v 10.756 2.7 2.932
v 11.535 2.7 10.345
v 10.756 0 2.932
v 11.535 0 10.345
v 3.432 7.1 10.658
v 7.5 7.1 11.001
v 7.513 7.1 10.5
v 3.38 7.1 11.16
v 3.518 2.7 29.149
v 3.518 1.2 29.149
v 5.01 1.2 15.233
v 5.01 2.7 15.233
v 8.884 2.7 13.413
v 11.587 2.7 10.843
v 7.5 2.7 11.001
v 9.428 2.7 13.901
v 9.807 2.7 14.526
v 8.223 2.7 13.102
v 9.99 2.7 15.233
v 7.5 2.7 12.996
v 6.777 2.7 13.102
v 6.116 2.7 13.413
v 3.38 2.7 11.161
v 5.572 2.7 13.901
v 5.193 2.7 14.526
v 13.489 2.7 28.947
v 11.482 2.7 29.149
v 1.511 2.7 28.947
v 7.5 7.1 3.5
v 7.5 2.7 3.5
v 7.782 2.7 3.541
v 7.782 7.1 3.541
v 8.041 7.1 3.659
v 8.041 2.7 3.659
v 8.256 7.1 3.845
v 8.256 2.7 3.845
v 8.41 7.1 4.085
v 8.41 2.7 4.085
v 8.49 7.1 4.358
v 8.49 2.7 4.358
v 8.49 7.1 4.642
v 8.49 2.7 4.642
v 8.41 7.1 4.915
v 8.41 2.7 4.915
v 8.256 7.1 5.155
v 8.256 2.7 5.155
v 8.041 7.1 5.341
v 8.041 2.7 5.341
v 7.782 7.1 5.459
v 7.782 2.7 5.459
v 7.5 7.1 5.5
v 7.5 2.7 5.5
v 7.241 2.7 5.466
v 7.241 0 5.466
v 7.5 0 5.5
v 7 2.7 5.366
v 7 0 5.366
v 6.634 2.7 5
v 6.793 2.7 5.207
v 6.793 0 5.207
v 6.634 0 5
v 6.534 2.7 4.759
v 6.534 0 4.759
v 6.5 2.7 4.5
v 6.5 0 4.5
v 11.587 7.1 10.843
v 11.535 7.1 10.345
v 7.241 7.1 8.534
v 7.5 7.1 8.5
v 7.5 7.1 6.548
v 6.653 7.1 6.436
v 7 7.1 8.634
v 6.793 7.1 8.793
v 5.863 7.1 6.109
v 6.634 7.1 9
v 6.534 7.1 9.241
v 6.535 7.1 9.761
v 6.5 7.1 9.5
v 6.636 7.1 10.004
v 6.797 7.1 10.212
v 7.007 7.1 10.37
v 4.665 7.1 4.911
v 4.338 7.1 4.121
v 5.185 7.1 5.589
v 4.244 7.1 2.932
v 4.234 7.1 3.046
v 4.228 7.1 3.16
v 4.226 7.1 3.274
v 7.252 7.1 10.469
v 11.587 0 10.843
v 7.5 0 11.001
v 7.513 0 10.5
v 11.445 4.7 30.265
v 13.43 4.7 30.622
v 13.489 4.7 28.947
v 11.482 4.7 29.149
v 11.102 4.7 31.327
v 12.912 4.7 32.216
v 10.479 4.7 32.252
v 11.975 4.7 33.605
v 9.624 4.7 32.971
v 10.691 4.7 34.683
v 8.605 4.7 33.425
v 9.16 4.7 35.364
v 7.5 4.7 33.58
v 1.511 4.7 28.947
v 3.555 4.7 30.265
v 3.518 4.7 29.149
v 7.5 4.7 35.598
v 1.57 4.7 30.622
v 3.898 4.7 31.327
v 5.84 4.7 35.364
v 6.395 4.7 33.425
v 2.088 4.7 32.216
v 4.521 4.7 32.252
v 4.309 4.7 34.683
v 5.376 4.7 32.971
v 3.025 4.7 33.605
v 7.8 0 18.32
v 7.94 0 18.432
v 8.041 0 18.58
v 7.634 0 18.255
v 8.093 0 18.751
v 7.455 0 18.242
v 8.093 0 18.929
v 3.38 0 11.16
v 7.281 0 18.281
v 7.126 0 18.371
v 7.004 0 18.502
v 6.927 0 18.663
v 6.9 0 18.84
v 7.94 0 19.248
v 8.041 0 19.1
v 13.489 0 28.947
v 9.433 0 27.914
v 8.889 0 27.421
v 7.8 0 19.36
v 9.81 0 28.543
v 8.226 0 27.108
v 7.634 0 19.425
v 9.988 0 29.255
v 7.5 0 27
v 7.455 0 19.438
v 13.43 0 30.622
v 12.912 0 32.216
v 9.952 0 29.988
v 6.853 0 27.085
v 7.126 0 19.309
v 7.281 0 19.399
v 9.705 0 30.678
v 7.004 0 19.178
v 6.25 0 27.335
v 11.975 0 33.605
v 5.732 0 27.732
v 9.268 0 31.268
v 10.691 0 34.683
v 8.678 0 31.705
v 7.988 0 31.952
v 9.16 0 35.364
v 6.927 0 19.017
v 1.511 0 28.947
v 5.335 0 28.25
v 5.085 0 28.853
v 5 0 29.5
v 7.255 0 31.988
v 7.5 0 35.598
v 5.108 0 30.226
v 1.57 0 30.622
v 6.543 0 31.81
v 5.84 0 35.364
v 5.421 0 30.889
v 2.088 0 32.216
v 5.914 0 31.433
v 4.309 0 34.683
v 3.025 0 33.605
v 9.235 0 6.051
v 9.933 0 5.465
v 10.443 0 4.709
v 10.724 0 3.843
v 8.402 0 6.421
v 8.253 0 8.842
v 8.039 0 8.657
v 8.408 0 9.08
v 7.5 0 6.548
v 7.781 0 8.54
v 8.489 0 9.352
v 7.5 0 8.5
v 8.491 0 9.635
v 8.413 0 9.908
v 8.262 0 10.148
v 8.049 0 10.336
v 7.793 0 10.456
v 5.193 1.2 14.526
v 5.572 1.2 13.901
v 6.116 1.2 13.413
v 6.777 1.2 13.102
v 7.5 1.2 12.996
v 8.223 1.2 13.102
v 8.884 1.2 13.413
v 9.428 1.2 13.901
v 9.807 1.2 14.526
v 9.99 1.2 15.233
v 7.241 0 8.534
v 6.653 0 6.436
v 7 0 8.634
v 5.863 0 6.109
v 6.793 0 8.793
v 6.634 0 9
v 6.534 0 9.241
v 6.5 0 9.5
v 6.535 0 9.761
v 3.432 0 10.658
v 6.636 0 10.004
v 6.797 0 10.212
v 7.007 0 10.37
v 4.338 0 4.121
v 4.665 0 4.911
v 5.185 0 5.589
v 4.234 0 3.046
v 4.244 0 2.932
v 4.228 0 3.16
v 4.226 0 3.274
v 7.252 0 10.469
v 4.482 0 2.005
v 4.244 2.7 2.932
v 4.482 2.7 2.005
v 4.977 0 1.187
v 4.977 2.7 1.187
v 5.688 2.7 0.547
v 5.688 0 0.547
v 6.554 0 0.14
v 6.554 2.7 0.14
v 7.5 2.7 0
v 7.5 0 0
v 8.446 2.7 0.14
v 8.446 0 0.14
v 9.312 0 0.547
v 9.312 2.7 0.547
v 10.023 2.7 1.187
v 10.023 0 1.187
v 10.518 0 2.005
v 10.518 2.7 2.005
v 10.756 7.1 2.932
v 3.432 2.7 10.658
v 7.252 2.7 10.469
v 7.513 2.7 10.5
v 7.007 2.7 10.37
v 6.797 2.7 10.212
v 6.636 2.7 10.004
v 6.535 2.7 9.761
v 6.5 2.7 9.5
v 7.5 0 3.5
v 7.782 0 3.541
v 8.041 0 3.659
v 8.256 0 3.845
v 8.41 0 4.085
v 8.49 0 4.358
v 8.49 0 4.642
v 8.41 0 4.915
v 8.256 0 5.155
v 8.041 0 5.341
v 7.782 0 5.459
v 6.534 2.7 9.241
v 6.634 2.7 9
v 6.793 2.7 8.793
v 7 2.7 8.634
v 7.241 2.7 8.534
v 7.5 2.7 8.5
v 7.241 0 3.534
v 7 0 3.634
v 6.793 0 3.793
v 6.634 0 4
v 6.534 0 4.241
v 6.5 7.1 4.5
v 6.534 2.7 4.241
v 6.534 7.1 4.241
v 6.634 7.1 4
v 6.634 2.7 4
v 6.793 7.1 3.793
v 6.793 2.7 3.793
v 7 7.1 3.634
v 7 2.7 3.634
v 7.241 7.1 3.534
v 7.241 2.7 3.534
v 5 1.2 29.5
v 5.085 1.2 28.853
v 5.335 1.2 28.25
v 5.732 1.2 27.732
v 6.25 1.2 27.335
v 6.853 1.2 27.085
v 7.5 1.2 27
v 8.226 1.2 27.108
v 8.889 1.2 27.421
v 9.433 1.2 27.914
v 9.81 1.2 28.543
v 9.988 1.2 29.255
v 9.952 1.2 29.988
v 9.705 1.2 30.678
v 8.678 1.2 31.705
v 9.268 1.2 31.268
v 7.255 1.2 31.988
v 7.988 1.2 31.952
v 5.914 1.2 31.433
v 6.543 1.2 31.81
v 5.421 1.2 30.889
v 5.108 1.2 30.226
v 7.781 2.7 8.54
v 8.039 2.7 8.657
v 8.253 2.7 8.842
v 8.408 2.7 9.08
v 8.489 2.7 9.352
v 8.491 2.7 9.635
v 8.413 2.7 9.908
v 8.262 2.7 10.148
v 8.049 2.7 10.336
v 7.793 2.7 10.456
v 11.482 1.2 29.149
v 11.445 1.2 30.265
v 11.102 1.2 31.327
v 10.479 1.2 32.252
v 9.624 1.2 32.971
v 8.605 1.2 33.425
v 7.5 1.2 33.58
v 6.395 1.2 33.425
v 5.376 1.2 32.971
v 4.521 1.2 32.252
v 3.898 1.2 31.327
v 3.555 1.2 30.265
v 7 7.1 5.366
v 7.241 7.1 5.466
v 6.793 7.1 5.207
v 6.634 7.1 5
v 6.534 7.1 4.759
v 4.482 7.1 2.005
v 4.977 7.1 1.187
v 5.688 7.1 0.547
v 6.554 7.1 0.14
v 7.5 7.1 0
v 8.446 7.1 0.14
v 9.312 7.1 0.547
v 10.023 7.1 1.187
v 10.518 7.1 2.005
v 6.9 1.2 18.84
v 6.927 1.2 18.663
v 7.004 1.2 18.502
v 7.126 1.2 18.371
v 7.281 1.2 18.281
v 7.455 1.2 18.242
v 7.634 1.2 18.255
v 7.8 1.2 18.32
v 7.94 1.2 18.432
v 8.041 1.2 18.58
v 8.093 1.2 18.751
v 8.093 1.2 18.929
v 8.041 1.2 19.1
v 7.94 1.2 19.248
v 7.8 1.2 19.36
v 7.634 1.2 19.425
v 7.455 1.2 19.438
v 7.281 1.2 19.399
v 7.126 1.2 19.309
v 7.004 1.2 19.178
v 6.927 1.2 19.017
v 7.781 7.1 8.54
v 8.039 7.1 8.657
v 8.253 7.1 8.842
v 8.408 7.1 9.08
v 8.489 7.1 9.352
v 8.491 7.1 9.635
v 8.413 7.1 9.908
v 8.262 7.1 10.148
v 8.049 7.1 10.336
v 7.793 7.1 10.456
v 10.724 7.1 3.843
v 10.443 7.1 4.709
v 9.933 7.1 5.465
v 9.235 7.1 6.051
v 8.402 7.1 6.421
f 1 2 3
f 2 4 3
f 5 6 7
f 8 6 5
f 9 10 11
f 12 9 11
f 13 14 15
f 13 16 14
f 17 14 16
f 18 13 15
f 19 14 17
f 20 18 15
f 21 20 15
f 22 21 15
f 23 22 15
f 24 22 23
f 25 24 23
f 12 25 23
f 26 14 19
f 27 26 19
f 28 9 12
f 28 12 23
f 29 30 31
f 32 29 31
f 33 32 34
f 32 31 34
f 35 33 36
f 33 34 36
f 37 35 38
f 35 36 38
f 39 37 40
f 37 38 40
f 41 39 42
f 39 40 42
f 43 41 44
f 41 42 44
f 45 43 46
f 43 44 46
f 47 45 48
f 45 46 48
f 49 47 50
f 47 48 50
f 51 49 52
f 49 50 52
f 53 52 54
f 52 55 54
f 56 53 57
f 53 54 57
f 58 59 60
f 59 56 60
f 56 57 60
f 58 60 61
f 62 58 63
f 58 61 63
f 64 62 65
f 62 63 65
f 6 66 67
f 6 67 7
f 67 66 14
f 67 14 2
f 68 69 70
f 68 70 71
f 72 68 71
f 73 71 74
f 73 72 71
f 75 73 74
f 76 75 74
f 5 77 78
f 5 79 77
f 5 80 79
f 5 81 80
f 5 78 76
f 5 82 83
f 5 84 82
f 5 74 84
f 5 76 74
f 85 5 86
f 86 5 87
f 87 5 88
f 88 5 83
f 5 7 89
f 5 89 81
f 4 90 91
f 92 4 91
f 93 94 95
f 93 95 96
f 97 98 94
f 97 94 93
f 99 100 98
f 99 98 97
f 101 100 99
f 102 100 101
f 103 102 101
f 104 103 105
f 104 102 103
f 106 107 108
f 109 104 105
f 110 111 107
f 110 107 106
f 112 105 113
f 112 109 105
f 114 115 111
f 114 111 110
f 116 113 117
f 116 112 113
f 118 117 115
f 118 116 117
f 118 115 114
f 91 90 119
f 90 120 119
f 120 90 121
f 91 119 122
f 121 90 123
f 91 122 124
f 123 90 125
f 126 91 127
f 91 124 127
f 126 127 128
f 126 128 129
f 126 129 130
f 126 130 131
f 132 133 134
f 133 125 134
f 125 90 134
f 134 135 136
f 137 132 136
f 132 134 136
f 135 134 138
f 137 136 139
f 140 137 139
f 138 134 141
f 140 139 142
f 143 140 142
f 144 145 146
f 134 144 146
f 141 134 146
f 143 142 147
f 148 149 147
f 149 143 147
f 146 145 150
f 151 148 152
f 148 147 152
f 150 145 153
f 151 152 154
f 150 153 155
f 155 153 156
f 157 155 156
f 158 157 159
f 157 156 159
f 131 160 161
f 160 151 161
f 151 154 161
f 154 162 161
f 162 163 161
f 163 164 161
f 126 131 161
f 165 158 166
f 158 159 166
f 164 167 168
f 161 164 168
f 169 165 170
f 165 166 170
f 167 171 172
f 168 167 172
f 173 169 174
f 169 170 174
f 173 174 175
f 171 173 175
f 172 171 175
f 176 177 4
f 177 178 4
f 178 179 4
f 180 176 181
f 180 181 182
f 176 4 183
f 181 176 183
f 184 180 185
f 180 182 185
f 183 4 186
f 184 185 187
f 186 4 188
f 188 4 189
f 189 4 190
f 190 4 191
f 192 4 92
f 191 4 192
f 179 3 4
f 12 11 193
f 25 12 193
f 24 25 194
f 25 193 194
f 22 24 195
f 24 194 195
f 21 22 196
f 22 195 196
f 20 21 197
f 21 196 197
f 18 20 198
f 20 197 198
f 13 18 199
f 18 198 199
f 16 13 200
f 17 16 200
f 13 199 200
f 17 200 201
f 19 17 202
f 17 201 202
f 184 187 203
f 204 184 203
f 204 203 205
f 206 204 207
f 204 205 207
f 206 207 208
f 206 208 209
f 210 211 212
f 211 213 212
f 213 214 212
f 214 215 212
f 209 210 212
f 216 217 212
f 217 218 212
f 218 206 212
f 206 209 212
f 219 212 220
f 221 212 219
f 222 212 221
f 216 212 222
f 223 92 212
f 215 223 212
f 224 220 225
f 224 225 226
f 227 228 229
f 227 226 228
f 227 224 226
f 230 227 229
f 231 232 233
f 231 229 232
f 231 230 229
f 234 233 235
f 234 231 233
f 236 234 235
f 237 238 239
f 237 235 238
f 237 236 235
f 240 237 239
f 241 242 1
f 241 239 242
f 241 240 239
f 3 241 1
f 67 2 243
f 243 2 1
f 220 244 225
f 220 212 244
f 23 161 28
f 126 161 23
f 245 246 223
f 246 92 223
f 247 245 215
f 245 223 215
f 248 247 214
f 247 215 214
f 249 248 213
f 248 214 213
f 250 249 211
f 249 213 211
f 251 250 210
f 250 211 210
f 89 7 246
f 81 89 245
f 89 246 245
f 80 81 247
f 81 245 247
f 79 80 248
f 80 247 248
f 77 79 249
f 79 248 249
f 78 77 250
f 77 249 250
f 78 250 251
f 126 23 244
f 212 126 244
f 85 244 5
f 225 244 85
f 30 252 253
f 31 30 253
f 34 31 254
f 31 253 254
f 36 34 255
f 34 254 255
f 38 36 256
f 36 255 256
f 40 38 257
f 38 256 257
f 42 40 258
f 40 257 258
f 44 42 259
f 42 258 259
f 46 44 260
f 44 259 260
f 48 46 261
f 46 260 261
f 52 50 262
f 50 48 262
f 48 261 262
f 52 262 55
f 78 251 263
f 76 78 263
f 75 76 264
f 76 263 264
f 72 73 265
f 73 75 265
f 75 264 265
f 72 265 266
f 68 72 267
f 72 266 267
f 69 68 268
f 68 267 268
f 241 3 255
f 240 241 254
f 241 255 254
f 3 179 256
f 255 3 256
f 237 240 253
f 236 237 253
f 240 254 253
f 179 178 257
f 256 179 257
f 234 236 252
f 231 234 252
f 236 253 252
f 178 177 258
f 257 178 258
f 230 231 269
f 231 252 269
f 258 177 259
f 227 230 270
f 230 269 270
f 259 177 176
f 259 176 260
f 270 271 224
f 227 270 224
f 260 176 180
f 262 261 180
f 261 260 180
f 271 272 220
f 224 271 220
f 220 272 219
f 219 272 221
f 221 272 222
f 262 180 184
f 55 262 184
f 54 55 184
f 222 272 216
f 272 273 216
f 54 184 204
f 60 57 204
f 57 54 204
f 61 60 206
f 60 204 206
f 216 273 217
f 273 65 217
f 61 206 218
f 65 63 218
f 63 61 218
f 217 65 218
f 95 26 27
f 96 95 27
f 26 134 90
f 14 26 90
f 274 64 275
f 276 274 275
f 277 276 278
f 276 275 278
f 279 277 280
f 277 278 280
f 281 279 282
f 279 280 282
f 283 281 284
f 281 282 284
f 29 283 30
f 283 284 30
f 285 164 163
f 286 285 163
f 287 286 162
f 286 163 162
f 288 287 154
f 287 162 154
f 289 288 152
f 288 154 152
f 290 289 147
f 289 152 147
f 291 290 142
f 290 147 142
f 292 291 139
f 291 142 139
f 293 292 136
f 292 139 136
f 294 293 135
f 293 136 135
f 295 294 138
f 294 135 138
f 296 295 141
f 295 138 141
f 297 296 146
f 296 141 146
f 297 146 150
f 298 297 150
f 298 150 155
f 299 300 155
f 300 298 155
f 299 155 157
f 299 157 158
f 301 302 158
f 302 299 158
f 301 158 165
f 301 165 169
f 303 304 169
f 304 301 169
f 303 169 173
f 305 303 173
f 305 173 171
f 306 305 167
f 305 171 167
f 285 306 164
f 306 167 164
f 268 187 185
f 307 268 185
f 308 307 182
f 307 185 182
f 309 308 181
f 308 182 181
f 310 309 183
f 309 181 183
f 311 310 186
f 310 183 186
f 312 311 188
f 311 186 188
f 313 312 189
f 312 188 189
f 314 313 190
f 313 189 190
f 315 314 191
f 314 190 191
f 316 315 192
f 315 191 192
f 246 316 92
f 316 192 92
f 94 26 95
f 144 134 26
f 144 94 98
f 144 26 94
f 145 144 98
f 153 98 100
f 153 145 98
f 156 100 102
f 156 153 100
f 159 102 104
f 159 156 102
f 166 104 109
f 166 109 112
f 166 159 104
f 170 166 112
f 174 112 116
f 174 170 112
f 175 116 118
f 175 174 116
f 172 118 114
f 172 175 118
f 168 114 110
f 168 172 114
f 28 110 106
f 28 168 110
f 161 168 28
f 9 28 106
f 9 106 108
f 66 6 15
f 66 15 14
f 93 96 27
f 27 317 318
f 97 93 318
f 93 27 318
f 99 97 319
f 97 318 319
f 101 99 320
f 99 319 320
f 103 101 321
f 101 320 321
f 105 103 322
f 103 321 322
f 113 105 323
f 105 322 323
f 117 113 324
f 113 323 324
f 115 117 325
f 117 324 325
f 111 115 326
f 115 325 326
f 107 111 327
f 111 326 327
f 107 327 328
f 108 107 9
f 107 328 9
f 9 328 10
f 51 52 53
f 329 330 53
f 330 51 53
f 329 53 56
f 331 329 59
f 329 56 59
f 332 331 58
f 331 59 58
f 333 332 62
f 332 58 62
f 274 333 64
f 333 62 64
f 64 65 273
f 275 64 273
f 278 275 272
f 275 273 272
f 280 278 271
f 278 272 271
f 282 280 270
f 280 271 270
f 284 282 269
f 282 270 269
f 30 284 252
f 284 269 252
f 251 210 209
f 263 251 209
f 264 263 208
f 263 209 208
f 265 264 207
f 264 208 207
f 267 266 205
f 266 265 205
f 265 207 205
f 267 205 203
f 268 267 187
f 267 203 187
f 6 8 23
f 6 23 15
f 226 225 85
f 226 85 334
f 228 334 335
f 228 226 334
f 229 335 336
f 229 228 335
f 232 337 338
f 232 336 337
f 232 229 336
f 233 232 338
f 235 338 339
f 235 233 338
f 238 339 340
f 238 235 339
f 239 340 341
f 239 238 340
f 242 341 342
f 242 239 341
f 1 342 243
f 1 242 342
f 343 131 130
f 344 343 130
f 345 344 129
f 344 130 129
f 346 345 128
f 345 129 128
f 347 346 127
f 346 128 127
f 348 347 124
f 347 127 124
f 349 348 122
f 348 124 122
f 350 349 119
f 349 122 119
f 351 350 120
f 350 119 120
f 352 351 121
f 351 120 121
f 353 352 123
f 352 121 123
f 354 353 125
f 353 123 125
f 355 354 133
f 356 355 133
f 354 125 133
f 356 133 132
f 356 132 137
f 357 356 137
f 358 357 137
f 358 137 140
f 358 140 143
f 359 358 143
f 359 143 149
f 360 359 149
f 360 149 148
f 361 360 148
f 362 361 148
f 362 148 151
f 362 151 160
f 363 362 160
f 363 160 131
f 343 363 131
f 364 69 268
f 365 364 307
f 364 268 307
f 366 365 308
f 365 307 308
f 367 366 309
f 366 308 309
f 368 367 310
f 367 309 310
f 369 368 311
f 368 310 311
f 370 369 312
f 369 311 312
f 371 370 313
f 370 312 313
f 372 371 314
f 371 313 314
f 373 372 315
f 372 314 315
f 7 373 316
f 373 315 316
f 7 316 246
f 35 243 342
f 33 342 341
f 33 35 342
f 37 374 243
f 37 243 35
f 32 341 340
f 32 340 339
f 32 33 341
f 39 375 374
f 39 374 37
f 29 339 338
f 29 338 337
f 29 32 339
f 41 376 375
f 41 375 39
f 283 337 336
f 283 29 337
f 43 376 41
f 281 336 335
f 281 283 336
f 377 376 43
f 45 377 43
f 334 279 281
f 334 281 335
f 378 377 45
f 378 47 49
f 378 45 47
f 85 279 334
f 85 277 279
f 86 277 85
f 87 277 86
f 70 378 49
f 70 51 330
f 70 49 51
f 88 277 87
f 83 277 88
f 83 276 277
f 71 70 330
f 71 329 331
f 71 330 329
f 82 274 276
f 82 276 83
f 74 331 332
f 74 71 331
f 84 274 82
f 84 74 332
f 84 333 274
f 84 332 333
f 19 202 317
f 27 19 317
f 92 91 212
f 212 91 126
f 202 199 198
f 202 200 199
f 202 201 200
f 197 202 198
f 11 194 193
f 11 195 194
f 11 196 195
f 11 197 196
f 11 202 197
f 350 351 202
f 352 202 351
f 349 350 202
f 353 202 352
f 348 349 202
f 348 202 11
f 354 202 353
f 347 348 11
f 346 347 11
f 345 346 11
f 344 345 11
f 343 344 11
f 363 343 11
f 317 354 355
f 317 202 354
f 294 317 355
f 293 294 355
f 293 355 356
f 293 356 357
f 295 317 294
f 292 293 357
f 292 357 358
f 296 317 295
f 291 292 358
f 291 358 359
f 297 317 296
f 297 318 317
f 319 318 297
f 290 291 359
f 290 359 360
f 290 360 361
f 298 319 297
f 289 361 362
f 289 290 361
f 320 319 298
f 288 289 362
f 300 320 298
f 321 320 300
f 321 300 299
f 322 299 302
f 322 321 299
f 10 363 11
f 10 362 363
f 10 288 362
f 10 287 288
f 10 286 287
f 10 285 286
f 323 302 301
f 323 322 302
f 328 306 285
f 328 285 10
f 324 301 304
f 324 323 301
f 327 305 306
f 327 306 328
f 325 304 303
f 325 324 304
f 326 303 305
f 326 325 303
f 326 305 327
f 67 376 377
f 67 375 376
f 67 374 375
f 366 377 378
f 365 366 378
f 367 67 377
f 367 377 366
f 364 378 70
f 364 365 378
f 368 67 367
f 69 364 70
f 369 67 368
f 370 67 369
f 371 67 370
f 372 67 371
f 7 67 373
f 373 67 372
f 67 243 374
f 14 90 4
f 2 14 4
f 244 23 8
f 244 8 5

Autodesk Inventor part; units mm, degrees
ref_plane "YZ Plane" through (0, 0, 0) normal (1, 0, 0) x (0, 1, 0)
ref_plane "XZ Plane" through (0, 0, 0) normal (0, 1, 0) x (-1, 0, 0)
ref_plane "XY Plane" through (0, 0, 0) normal (0, 0, 1) x (1, 0, 0)
sketch "Sketch1" plane through (0, 0, 0) normal (0, 1, 0) x (-1, 0, 0)
  circle A0 centre (-7.5, 4.5) radius 1
  circle A1 centre (-7.5, 9.5) radius 1
  circle A2 centre (-7.5, 18.84) radius 0.6
  circle A3 centre (-7.5, 29.5) radius 2.5
  circle A4 centre (-7.5, 29.576) radius 6.0215
  circle A5 centre (-7.5, 29.576) radius 4.0045
  circle A6 centre (-7.5, 3.274) radius 3.274
  circle A7 centre (-7.5, 15.5) radius 2.5045
  line L0 (-7.5, 3.274) -> (-7.5, 29.576)
  line L1 (-3.5183, 29.1493) -> (-5.0098, 15.2331)
  line L2 (-9.9902, 15.2331) -> (-11.4817, 29.1493)
  line L3 (-1.5114, 28.947) -> (-4.2439, 2.932)
  line L4 (-13.4886, 28.947) -> (-10.7561, 2.932)
  line L5 (-1.5114, 28.947) -> (-3.5183, 29.1493)
  line L6 (-13.4886, 28.947) -> (-11.4817, 29.1493)
  line L7 (-3.4324, 10.6581) -> (-11.5347, 10.3447)
  line L8 (-3.3796, 11.1605) -> (-11.587, 10.843)
  point P0 (0, 0)
  point P1 (-7.5, 10.5007)
  point P2 (-7.5, 10.5)
  point P3 (-7.5387, 10.4993)
  dimension "d2" = 2
  dimension "d3" = 2
  dimension "d4" = 1.2
  dimension "d5" = 5
  dimension "d6" = 12.043
  dimension "d7" = 8.009
  dimension "d8" = 6.548
  dimension "d9" = 5.009
  dimension "d10" = 5
  dimension "d11" = 1.226
  dimension "d12" = 6
  dimension "d15" = 26.302
  dimension "d16" = 3.34
  dimension "d17" = 10.66
  dimension "d18" = 26.302
  dimension "d19" = 25
  dimension "d28" = 0.5
extrude "Extrusion1" add sketch "Sketch1" along normal blind 4.7 contours A4 L5 A5 L6
extrude "Extrusion2" add sketch "Sketch1" along normal blind 2.7 contours A6 | A6 L4 L7 A1 L0 | L0 A1 L7 L3 A6 | L4 L8 L0 L7 | L0 L8 L3 L7 | L4 A4 L2 A7 L0 L8 | L0 A7 L1 A4 L3 L8 | L6 L2 A4 | A4 L1 L5
extrude "Extrusion3" add sketch "Sketch1" along normal blind 1.2 contours L0 A7 | A7 L0 | L2 A5 L0 A4 | A4 L0 A2 A7 L2 | A5 | A7 L0 A2 A4 L1 | A4 L0 A5 L1
extrude "Extrusion4" add sketch "Sketch1" along normal blind 7.1 contours A6 | A6 L4 L7 A1 L0 | L0 A1 L7 L3 A6 | L4 L8 L0 L7 | L0 L8 L3 L7
properties part number "servoarm"
